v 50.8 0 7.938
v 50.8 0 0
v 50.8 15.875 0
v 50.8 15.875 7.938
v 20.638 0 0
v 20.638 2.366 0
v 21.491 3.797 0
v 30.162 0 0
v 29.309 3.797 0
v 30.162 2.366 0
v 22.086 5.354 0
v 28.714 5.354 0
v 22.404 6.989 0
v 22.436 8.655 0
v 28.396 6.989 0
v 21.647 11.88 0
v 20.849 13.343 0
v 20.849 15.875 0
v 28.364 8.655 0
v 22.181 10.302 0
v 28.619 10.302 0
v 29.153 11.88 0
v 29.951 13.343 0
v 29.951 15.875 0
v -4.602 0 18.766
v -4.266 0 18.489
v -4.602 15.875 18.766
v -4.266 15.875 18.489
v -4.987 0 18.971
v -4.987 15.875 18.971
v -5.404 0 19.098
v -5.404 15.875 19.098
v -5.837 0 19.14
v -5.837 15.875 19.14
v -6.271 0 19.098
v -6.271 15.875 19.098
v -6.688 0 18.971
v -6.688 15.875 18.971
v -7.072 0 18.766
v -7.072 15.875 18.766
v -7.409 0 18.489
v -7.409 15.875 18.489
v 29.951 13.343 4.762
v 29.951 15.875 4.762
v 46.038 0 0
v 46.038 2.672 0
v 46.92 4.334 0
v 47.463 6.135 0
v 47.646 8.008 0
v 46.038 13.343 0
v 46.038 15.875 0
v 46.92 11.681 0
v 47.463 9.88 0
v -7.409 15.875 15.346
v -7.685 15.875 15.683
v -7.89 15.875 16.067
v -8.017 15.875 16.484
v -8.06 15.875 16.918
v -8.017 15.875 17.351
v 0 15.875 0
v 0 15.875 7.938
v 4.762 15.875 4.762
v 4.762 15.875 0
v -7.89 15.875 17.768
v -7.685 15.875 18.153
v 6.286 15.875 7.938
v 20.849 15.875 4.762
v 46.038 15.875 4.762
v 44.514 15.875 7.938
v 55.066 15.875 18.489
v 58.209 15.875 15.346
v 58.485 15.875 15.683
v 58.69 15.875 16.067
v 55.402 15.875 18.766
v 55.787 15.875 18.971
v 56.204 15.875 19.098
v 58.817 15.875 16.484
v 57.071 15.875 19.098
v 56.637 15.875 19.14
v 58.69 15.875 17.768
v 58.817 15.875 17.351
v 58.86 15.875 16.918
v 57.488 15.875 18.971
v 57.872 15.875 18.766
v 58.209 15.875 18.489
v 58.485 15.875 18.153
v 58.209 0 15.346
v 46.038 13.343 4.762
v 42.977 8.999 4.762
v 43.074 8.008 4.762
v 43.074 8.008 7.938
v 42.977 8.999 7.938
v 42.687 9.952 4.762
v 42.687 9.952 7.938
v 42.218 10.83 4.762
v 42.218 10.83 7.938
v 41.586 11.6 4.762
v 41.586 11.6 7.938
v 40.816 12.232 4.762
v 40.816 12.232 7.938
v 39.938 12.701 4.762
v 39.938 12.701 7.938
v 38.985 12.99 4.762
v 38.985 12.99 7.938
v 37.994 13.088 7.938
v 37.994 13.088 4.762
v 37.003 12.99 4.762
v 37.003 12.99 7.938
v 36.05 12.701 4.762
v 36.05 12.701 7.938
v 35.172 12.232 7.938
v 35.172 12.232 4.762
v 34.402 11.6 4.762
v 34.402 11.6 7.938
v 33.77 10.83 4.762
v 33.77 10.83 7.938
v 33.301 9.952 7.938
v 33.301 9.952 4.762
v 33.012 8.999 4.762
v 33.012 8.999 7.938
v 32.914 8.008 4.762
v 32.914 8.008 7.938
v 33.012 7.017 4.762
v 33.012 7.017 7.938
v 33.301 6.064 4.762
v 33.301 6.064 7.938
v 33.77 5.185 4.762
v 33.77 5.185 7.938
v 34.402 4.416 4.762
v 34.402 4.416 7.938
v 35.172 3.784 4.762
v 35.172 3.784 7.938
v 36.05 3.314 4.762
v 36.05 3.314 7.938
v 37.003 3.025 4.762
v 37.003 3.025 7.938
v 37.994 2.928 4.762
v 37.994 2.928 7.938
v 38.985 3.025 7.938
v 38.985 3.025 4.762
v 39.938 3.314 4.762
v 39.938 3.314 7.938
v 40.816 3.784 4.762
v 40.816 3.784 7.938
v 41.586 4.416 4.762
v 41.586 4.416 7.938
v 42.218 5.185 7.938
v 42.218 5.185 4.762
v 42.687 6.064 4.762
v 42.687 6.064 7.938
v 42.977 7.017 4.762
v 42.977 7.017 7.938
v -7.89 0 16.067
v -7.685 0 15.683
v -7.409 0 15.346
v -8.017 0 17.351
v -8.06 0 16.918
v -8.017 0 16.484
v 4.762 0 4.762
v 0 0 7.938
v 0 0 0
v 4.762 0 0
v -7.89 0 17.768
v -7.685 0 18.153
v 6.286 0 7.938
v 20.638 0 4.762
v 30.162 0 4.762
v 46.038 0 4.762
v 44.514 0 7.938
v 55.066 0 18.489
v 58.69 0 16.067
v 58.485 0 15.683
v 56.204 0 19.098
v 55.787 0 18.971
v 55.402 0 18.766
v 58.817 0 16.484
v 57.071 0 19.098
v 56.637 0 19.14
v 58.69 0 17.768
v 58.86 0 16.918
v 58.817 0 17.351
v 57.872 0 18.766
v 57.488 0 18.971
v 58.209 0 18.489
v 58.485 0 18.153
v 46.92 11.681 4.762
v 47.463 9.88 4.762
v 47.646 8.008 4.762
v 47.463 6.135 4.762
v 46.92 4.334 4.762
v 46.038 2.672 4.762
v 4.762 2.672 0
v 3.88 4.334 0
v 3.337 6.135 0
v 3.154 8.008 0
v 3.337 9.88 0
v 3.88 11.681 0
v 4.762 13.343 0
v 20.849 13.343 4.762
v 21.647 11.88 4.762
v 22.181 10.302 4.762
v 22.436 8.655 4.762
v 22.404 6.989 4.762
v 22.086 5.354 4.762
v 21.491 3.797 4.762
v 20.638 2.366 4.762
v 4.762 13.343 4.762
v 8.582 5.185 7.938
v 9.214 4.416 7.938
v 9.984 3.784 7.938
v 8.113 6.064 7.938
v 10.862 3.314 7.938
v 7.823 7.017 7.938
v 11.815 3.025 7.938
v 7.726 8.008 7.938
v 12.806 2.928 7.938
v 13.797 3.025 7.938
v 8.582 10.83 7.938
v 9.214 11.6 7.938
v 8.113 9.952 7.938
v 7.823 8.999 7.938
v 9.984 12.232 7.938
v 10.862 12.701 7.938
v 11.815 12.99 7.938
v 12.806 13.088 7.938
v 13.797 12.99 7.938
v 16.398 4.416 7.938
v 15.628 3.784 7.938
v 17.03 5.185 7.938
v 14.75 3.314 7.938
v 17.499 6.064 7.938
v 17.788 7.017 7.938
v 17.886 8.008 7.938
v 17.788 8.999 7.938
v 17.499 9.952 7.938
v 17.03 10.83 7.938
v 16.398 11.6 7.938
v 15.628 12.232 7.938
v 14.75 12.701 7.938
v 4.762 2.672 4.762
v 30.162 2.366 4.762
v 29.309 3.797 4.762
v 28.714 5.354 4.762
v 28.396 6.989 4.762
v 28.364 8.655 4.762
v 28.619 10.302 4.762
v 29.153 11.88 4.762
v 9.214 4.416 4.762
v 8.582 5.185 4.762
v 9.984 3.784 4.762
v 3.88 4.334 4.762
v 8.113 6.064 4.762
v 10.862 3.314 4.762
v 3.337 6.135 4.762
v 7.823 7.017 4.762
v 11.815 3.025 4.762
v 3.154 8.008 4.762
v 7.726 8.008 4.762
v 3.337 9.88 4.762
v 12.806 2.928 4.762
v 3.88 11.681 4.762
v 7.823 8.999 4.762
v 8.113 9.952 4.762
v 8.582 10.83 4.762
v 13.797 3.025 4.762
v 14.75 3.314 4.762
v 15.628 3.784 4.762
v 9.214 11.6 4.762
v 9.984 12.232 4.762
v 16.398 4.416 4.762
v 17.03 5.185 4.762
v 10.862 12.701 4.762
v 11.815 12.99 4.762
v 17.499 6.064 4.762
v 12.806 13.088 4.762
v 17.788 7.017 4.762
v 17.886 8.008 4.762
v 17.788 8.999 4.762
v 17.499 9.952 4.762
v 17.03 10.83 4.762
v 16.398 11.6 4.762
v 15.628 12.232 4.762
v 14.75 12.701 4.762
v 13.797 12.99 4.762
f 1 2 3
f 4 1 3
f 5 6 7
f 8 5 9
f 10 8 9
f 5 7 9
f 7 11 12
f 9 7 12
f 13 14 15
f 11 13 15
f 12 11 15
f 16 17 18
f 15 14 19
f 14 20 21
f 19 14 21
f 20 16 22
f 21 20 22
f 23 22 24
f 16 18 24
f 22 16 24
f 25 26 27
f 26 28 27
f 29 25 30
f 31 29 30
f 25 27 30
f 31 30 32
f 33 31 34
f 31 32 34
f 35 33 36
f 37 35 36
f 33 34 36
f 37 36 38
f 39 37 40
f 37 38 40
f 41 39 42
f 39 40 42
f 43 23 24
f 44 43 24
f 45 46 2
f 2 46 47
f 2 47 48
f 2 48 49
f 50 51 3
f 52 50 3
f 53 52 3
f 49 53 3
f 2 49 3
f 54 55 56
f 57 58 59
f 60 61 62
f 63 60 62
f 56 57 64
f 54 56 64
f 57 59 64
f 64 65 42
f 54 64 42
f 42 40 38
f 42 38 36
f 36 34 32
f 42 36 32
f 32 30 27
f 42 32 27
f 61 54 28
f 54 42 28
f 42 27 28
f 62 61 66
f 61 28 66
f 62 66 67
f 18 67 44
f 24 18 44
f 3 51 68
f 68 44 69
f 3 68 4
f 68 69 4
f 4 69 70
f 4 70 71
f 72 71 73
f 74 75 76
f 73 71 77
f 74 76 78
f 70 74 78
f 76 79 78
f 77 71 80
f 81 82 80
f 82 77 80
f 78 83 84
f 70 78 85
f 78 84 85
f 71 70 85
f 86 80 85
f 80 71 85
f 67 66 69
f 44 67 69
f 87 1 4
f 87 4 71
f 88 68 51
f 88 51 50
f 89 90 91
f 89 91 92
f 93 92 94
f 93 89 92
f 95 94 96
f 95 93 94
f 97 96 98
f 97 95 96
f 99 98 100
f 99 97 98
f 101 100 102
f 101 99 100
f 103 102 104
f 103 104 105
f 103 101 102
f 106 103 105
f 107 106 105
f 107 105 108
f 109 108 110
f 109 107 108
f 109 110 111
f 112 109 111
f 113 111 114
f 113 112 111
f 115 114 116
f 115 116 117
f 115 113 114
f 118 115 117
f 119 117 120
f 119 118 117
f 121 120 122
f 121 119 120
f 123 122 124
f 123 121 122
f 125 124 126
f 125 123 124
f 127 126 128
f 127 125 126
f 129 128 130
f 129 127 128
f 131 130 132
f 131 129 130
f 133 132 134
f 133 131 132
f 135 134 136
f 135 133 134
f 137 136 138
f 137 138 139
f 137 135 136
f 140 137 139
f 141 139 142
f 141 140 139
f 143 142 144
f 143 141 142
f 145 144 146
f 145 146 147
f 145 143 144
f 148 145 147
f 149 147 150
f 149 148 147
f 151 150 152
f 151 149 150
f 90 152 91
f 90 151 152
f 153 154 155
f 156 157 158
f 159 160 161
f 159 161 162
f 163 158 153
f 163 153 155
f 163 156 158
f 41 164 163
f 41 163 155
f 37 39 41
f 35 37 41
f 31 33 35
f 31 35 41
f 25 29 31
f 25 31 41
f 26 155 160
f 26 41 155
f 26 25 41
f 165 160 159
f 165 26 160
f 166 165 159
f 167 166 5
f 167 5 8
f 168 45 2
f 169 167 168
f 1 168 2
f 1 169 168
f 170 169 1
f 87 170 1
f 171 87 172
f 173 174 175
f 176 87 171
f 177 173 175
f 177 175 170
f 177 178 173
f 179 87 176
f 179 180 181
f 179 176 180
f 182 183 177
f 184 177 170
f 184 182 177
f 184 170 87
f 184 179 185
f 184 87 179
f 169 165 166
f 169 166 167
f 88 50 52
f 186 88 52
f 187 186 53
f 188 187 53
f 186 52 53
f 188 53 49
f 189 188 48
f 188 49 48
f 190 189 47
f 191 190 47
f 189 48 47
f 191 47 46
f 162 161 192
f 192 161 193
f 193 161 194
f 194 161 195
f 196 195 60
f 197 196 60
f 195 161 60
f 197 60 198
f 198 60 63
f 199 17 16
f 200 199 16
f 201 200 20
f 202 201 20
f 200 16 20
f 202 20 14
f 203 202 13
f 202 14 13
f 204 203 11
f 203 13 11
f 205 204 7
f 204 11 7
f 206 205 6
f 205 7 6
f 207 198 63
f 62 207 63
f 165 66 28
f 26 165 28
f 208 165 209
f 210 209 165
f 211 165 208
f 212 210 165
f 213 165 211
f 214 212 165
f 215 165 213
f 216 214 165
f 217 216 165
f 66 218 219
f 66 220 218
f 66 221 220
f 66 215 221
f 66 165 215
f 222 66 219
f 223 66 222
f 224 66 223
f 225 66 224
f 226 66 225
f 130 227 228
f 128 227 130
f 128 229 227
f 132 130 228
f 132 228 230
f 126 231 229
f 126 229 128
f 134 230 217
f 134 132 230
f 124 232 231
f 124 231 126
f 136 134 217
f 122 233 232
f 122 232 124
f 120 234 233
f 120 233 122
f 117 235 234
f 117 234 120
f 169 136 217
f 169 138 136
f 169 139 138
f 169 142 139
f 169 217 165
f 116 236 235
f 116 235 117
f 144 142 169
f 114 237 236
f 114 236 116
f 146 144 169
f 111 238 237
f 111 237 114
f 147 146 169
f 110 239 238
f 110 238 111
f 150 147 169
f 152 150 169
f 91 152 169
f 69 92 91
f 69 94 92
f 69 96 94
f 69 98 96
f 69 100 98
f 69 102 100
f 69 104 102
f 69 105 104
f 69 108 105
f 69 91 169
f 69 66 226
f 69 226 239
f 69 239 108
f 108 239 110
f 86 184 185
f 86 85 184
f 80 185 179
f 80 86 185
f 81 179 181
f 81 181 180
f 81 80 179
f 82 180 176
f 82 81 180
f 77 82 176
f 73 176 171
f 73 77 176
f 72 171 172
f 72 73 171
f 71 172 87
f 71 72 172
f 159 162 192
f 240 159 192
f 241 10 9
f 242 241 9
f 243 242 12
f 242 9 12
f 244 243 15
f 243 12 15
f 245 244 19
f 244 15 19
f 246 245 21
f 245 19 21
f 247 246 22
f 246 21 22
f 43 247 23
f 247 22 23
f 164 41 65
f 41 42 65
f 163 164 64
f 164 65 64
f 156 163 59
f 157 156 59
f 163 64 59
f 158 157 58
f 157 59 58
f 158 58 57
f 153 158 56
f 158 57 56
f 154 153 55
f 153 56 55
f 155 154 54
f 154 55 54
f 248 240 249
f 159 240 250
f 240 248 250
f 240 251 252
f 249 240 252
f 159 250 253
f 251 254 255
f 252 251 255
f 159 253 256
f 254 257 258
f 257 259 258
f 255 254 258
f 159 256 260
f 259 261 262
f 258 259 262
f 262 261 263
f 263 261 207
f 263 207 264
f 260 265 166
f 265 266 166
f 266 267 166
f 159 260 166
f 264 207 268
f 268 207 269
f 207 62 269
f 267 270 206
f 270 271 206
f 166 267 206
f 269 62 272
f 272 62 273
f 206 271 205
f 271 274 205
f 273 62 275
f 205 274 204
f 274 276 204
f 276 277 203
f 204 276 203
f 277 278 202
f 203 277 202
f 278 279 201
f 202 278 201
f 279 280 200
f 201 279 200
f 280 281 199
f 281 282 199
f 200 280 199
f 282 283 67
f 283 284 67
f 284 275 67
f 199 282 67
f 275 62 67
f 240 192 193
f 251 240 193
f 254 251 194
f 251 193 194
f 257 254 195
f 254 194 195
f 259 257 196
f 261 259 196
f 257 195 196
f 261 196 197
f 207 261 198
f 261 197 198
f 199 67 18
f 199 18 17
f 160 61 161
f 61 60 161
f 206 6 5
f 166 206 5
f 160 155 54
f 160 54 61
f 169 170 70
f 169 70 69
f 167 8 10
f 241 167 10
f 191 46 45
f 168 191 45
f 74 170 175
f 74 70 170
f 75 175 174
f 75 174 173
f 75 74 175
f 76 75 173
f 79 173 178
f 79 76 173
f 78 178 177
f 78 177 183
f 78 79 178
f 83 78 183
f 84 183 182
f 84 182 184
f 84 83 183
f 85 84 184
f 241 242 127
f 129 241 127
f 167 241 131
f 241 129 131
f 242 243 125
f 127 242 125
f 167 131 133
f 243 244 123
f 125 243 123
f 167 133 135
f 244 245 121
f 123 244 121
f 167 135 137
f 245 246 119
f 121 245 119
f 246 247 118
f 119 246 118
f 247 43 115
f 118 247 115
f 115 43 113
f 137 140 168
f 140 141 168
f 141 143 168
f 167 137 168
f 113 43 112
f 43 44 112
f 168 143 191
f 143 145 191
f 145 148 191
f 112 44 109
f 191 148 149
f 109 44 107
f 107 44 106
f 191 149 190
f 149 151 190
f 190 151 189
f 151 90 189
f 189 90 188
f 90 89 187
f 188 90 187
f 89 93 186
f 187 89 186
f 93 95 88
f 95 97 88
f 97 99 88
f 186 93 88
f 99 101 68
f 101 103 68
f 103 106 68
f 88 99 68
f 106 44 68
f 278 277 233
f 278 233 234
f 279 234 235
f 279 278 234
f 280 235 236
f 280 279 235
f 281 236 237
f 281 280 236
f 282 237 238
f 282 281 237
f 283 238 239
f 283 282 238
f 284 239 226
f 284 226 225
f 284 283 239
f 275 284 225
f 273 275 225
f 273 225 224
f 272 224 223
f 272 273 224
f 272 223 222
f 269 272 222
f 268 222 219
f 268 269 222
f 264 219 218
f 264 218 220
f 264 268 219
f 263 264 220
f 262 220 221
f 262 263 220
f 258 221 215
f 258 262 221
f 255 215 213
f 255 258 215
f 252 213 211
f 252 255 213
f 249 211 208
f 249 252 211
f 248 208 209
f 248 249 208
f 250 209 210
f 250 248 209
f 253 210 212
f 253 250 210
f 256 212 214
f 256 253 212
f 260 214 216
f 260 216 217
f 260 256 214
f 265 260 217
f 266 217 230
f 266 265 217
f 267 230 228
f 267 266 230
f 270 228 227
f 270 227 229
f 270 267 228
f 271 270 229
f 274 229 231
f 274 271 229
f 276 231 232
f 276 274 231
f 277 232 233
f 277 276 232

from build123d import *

# Parameters (mm, degrees)
F1_DEPTH = 4.7625
F2_R     = 5.08
F3_DEPTH = 3.175
F6_DEPTH = 15.875
F7_R     = 2.22249


# Not quite as in the source:
# - a fillet or chamfer is up to 0.001 mm smaller than in the source, because OpenCascade refuses the exact size


with BuildPart() as f1:
    # F0 (on Top) → F1 (new body)
    with BuildSketch(Plane.XY):
        with BuildLine():
            Line((0, 15.875), (0, 0))
            Line((0, 0), (4.7625, 0))
            Line((4.7625, 0), (4.7625, 2.6723581453))
            ThreePointArc((4.7625, 2.6723581453), (3.1538333333, 8.0077018914), (4.7625, 13.3430456375))
            Line((4.7625, 13.3430456375), (4.7625, 15.875))
            Line((4.7625, 15.875), (3.175, 15.875))
            Line((3.175, 15.875), (0, 15.875))
        make_face()
    extrude(amount=F1_DEPTH)


with BuildPart() as f1b:
    # F0 (on Top) → F1, piece 2 (new body)
    with BuildSketch(Plane.XY):
        with BuildLine():
            Line((20.6375, 2.3662392068), (20.6375, 0))
            Line((20.6375, 0), (25.4, 0))
            Line((25.4, 0), (25.4, 15.875))
            Line((25.4, 15.875), (20.8491666667, 15.875))
            Line((20.8491666667, 15.875), (20.8491666667, 13.3430456375))
            ThreePointArc((20.8491666667, 13.3430456375), (22.4560393469, 7.8216161703), (20.6375, 2.3662392068))
        make_face()
        with BuildLine():
            Line((25.4, 15.875), (25.4, 0))
            Line((25.4, 0), (30.1625, 0))
            Line((30.1625, 0), (30.1625, 2.3662392068))
            ThreePointArc((30.1625, 2.3662392068), (28.3439606531, 7.8216161703), (29.9508333333, 13.3430456375))
            Line((29.9508333333, 13.3430456375), (29.9508333333, 15.875))
            Line((29.9508333333, 15.875), (25.4, 15.875))
        make_face()
    extrude(amount=F1_DEPTH)


with BuildPart() as f1c:
    # F0 (on Top) → F1, piece 3 (new body)
    with BuildSketch(Plane.XY):
        with BuildLine():
            Line((46.0375, 2.6723581453), (46.0375, 0))
            Line((46.0375, 0), (50.8, 0))
            Line((50.8, 0), (50.8, 15.875))
            Line((50.8, 15.875), (46.0375, 15.875))
            Line((46.0375, 15.875), (46.0375, 13.3430456375))
            ThreePointArc((46.0375, 13.3430456375), (47.6461666667, 8.0077018914), (46.0375, 2.6723581453))
        make_face()
    extrude(amount=F1_DEPTH)


with BuildPart() as f3:
    # F2 (on face) → F3 (new body)
    with BuildSketch(Plane.XY.offset(4.7625)):
        with BuildLine():
            Line((25.4, 15.875), (4.7625, 15.875))
            Line((4.7625, 15.875), (4.7625, 13.3430456375))
            ThreePointArc((4.7625, 13.3430456375), (3.1538333333, 8.0077018914), (4.7625, 2.6723581453))
            Line((4.7625, 2.6723581453), (4.7625, 0))
            Line((4.7625, 0), (20.6375, 0))
            Line((20.6375, 0), (25.4, 0))
            Line((25.4, 0), (25.4, 2.2267585155))
            Line((25.4, 2.2267585155), (25.4, 15.875))
        make_face()
        with Locations((12.8058333333, 8.0077018914)):
            Circle(F2_R, mode=Mode.SUBTRACT)
        Polygon((46.0375, 15.875), (25.4, 15.875), (25.4, 2.2267585155), (25.4, 0), (30.1625, 0), (50.8, 0), (50.8, 15.875), align=None)
        with Locations((37.9941666667, 8.0077018914)):
            Circle(F2_R, mode=Mode.SUBTRACT)
        with BuildLine():
            Line((4.7625, 15.875), (0, 15.875))
            Line((0, 15.875), (0, 0))
            Line((0, 0), (4.7625, 0))
            Line((4.7625, 0), (4.7625, 2.6723581453))
            ThreePointArc((4.7625, 2.6723581453), (3.1538333333, 8.0077018914), (4.7625, 13.3430456375))
            Line((4.7625, 13.3430456375), (4.7625, 15.875))
        make_face()
    extrude(amount=F3_DEPTH)


with BuildPart() as f1_1:
    add(f1.part)

    # F4: union F3, F1b, F1c
    add(f3.part)
    add(f1b.part)
    add(f1c.part)

    # F5 (on face) → F6 (join)
    with BuildSketch(Plane.XZ):
        Polygon((56.6371664787, 20.0608457634), (44.5138207153, 7.9375), (50.8, 7.9375), (59.7802561211, 16.9177561211), align=None)
        Polygon((-8.9802561211, 16.9177561211), (0, 7.9375), (6.2861792847, 7.9375), (-5.8371664787, 20.0608457634), align=None)
    extrude(amount=-F6_DEPTH)

    # F7 (radius 2.2225 in the source; OpenCascade refuses exactly that, so slightly less here)
    f7_edges = [f1_1.edges().sort_by_distance(p)[0] for p in [
        (-8.980256, 7.9375, 16.917756),
        (-5.837166, 7.9375, 20.060846),
        (56.637166, 7.9375, 20.060846),
        (59.780256, 7.9375, 16.917756),
    ]]
    fillet(f7_edges, radius=F7_R)


solid = f1_1.part
